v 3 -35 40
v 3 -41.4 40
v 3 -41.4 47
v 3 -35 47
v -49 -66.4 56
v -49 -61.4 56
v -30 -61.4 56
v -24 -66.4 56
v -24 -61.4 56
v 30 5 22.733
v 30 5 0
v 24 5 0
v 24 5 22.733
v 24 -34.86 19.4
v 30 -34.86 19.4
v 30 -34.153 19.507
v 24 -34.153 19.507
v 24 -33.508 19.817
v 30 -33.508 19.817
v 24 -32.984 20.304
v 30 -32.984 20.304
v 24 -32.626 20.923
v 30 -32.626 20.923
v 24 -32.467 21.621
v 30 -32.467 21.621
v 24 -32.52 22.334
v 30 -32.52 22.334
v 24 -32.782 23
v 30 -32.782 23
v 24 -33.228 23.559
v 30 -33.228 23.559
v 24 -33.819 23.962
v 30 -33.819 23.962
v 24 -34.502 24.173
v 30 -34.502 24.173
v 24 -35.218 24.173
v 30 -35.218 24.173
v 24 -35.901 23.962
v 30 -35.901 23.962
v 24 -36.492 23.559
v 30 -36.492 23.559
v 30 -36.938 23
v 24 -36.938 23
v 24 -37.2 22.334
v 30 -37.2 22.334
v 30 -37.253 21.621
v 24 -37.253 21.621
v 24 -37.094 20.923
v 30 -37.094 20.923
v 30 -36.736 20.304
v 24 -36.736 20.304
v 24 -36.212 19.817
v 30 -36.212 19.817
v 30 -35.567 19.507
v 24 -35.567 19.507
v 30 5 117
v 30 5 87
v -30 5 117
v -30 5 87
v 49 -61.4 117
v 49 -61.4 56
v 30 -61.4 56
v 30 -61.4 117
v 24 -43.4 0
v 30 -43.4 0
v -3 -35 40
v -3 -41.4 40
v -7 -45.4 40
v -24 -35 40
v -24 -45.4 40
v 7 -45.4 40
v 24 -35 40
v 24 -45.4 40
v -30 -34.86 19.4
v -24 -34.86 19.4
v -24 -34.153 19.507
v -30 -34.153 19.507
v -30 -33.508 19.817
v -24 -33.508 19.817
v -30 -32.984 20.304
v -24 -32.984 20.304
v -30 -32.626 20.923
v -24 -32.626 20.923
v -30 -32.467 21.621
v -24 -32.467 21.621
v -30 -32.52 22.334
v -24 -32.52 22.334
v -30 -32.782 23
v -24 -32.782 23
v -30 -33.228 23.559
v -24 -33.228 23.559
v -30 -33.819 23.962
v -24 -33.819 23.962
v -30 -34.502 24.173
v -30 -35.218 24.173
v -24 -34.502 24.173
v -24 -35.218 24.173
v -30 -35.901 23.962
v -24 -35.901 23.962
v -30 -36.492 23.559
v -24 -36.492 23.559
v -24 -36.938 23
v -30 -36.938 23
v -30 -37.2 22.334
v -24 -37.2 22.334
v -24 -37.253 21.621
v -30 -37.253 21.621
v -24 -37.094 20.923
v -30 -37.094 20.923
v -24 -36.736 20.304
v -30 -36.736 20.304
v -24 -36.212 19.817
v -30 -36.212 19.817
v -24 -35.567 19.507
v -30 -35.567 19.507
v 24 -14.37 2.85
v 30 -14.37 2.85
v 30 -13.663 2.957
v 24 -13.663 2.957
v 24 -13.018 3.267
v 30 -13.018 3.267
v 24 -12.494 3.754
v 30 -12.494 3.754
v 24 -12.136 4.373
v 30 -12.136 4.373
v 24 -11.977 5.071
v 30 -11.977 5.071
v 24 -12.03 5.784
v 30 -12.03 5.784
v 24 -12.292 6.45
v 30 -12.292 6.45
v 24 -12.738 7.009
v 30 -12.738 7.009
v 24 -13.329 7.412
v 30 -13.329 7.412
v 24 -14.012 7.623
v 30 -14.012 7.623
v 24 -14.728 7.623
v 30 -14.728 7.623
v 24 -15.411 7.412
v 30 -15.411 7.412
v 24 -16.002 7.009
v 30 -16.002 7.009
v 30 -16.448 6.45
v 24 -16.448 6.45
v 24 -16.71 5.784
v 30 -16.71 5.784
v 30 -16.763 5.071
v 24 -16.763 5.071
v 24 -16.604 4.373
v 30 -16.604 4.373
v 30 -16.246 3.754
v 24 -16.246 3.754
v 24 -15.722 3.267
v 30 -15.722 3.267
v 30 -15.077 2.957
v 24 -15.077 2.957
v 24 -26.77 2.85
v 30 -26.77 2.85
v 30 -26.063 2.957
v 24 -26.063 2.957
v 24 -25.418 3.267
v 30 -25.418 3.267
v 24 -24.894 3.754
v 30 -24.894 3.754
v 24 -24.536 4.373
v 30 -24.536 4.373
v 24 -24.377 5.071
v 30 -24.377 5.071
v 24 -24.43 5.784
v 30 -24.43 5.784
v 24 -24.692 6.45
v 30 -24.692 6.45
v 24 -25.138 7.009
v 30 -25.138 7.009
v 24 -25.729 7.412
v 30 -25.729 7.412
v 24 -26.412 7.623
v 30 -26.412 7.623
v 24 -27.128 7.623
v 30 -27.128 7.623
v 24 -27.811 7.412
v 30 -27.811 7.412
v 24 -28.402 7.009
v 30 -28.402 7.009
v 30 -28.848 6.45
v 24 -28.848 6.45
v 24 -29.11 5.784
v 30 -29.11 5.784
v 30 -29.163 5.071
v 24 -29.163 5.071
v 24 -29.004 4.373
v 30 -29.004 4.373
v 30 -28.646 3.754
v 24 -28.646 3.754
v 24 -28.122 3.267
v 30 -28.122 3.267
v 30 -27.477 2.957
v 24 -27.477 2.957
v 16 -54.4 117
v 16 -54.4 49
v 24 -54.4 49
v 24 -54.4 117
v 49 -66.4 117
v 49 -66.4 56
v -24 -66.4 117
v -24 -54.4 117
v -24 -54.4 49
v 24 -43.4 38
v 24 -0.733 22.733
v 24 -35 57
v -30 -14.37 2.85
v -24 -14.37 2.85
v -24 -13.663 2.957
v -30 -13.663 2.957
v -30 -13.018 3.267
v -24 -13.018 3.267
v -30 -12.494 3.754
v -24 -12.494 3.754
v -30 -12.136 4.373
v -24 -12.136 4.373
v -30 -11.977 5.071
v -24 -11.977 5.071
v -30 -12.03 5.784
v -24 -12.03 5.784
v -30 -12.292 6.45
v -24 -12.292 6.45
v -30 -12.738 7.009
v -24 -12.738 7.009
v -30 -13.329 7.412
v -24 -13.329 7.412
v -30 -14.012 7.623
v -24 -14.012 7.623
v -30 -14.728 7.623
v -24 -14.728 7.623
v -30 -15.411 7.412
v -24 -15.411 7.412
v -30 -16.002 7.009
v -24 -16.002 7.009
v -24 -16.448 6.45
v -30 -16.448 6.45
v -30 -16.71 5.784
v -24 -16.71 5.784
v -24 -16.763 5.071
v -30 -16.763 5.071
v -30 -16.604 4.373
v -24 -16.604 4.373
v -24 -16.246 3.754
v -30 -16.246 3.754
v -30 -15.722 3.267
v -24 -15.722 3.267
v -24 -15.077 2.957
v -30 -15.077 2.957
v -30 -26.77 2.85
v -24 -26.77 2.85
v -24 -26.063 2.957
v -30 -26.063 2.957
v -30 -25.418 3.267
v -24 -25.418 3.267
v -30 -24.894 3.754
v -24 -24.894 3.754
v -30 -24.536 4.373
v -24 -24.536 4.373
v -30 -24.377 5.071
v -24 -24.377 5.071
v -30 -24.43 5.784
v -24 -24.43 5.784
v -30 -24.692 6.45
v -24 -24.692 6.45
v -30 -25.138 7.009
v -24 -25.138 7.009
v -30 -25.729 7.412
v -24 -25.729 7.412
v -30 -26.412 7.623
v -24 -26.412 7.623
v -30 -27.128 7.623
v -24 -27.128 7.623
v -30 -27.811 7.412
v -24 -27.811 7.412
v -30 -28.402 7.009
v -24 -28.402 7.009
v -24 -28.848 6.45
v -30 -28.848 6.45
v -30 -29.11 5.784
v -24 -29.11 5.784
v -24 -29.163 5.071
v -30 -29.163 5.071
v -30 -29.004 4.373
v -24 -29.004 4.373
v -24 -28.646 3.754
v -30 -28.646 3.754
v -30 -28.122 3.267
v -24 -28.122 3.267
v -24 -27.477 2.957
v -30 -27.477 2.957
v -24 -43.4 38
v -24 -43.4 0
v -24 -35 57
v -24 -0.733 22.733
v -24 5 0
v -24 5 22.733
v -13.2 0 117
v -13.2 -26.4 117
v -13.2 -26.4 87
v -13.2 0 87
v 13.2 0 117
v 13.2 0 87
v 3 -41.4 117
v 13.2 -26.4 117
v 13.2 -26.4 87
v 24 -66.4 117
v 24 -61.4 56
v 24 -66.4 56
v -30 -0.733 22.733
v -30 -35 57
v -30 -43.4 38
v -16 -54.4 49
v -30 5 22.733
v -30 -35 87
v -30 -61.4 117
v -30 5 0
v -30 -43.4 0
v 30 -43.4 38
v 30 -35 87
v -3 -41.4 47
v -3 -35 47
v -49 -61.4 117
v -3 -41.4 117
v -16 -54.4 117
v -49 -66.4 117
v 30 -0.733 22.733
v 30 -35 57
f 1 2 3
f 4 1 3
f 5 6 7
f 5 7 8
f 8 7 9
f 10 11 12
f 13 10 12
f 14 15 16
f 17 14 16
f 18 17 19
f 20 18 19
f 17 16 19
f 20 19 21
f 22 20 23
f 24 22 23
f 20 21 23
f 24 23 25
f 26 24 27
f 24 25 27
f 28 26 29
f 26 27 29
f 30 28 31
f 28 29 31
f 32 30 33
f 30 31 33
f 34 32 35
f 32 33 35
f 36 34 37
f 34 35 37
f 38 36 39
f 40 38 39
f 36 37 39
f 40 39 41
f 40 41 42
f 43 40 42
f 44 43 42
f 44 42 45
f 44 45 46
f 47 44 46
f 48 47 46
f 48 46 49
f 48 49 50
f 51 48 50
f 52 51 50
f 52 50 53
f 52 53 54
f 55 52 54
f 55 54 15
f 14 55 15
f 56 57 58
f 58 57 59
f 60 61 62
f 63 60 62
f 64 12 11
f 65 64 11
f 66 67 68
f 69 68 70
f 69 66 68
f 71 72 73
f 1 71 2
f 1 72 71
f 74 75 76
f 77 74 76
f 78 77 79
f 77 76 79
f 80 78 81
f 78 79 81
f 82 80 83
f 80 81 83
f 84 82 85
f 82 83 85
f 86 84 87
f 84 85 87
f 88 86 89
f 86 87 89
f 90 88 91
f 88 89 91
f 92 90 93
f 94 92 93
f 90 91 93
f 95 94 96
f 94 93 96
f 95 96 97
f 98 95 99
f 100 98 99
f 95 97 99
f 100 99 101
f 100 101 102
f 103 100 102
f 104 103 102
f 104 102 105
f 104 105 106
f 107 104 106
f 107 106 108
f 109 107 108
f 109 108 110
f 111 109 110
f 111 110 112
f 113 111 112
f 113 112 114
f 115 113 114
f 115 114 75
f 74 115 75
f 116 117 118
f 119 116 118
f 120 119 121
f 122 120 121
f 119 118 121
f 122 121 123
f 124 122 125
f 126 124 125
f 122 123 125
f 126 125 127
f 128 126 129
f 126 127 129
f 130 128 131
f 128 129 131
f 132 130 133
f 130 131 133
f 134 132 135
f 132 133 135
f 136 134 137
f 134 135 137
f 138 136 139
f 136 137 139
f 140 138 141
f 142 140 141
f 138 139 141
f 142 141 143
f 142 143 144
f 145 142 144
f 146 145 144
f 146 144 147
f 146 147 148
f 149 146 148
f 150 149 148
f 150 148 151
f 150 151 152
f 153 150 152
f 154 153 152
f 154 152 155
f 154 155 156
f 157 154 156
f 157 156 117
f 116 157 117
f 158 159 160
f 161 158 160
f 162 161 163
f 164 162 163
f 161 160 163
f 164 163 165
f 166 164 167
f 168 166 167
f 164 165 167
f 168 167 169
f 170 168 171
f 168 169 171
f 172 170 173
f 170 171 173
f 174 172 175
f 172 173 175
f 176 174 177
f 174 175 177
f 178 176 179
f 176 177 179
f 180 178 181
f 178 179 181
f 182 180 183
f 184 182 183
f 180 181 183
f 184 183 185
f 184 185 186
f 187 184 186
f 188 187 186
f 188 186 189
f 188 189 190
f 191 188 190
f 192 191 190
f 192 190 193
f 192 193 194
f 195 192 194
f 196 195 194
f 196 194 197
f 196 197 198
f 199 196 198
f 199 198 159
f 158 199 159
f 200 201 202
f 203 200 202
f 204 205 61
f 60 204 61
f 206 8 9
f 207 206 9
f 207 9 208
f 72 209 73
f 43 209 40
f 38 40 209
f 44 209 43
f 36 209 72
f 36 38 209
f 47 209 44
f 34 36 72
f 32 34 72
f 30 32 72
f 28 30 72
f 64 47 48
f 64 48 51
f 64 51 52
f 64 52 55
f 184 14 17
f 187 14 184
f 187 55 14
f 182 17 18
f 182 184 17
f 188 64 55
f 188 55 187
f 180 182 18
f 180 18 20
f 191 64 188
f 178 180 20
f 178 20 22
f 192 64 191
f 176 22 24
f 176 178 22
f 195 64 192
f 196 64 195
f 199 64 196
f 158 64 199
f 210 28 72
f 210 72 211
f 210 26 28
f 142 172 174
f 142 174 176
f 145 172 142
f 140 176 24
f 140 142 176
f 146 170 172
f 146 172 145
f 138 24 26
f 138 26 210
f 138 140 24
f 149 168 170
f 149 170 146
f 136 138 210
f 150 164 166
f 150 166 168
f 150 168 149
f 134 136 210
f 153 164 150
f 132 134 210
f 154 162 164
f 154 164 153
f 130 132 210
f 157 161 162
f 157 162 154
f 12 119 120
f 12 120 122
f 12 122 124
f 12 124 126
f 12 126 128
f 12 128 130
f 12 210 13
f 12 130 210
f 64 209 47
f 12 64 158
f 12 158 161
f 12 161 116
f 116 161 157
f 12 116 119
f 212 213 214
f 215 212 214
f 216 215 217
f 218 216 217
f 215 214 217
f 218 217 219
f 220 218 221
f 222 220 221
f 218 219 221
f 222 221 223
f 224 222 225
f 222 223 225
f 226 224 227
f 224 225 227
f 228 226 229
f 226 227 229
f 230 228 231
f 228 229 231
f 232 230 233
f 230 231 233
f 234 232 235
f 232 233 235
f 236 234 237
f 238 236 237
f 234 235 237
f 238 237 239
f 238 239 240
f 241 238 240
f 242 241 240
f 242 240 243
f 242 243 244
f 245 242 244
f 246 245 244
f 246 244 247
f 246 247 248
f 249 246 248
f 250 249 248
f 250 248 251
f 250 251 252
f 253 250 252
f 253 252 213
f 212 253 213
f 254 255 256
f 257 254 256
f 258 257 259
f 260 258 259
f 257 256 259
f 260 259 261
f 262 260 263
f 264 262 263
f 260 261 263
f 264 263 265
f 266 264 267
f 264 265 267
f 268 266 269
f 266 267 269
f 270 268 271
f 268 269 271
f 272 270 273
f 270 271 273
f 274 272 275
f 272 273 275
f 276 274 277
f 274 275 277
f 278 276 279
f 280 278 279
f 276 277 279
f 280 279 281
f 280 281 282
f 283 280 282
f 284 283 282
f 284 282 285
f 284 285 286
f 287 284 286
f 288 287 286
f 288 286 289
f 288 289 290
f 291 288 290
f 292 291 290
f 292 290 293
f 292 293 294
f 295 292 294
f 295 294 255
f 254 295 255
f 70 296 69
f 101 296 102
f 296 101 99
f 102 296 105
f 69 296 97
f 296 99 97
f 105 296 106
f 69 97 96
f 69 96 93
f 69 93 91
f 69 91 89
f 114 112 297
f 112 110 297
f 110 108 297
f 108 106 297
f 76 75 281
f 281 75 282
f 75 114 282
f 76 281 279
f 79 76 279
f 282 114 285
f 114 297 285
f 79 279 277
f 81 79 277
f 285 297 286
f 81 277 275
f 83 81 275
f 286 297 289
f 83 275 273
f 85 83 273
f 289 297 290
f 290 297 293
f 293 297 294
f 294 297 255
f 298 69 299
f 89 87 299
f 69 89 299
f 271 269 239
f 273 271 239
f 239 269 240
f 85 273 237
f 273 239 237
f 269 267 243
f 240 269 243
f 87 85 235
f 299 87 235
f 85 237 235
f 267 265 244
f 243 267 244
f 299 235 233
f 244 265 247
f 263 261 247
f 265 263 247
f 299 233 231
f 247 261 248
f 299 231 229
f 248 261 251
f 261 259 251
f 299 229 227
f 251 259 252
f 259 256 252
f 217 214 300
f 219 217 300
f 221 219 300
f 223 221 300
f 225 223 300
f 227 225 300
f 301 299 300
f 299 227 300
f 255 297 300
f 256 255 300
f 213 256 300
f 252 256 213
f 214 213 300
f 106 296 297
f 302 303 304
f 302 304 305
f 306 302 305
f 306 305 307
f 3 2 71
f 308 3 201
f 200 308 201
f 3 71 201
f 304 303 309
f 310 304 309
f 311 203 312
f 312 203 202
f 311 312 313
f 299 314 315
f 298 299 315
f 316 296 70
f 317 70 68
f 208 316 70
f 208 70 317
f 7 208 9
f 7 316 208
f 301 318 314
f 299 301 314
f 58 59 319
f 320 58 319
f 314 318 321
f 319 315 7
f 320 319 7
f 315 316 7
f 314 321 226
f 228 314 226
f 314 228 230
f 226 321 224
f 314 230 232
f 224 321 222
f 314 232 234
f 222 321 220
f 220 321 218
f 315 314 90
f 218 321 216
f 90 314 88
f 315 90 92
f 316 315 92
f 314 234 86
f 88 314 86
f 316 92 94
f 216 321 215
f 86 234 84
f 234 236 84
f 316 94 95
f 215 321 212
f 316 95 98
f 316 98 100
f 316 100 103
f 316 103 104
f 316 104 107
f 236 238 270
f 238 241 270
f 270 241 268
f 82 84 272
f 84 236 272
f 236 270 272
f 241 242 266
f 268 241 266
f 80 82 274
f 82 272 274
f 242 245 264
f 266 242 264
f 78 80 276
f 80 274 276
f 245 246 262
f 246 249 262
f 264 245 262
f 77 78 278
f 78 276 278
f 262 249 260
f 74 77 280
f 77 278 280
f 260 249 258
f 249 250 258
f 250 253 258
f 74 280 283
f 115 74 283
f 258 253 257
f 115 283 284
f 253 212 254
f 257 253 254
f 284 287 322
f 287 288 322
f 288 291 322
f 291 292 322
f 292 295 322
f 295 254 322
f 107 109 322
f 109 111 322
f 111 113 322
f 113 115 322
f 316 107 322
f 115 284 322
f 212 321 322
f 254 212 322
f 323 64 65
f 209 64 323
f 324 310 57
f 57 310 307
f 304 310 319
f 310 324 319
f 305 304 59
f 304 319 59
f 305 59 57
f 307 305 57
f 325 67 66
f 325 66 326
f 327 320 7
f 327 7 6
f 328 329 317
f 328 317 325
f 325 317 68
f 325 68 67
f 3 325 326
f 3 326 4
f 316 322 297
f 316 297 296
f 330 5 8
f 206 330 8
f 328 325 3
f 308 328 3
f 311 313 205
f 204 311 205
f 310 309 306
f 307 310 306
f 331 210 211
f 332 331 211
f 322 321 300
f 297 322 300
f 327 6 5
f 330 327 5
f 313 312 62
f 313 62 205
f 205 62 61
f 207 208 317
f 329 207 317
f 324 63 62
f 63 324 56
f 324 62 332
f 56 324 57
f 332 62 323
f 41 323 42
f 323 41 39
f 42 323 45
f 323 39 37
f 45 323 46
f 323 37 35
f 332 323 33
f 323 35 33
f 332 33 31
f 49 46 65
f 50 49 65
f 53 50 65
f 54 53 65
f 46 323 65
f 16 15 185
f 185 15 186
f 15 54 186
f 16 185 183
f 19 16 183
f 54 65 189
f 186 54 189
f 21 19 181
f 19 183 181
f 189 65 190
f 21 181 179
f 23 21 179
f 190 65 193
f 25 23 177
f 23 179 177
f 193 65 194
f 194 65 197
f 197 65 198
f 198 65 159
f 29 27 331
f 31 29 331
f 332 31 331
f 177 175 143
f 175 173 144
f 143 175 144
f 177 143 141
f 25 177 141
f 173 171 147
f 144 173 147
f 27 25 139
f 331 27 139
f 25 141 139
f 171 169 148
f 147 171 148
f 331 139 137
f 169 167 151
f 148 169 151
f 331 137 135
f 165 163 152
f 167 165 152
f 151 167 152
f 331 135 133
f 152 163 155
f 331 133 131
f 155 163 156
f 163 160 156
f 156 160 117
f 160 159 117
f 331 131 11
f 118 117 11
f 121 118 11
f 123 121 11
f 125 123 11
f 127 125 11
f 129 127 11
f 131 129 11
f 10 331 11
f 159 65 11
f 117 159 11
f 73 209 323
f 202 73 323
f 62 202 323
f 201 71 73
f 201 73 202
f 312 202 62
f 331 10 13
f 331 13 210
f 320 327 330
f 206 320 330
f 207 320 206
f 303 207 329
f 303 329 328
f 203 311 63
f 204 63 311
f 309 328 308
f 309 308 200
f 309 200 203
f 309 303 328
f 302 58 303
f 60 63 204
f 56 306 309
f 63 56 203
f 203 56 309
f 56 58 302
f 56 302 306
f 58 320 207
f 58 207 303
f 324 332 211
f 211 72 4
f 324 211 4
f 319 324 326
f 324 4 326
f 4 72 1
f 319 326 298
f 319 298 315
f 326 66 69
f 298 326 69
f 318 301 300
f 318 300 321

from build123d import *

# Parameters (mm, degrees)
SKETCH1_W            = 26.4
SKETCH1_H            = 26.4
BOSS_EXTRUDE1_DEPTH  = 117
SKETCH60_W           = 48
SKETCH60_H           = 40
CUT_EXTRUDE1_DEPTH   = 87
CUT_EXTRUDE2_DEPTH   = 157.009486891
M4_CLEARANCE_HOLE1_D = 4.8
SKETCH66_W           = 48
SKETCH66_H           = 31.290838495
CUT_EXTRUDE3_DEPTH   = 40
CUT_EXTRUDE5_DEPTH   = 157.009486891
SKETCH69_W           = 98
SKETCH69_H           = 56
CUT_EXTRUDE6_DEPTH   = 144.174578749
SKETCH70_W           = 6
SKETCH70_H           = 7
CUT_EXTRUDE7_DEPTH   = 136.066502139


with BuildPart() as part:
    # Sketch1 → Boss-Extrude1 (new body)
    with BuildSketch(Plane.XY):
        Polygon((-3, -41.4), (3, -41.4), (16, -54.4), (24, -54.4), (24, -66.4), (49, -66.4), (49, -61.4), (30, -61.4), (30, 5), (-30, 5), (-30, -61.4), (-49, -61.4), (-49, -66.4), (-24, -66.4), (-24, -54.4), (-16, -54.4), align=None)
        with Locations((0, -13.2)):
            Rectangle(SKETCH1_W, SKETCH1_H, mode=Mode.SUBTRACT)
    extrude(amount=BOSS_EXTRUDE1_DEPTH)

    # Sketch60 → Cut-Extrude1 (cut)
    with BuildSketch(Plane(origin=(0, 0, 0), x_dir=(-1, 0, 0), z_dir=(0, 0, -1))):
        with Locations((0, -15)):
            Rectangle(SKETCH60_W, SKETCH60_H)
    extrude(amount=-CUT_EXTRUDE1_DEPTH, mode=Mode.SUBTRACT)

    # Sketch61 → Cut-Extrude2 (cut, through all)
    with BuildSketch(Plane.ZY.offset(30)):
        Polygon((0, -43.4), (38, -43.4), (56, -61.4), (0, -61.4), align=None)
    extrude(amount=-CUT_EXTRUDE2_DEPTH, mode=Mode.SUBTRACT)

    # M4 Clearance Hole1 (through all)
    with Locations(Plane.ZY.offset(30)):
        with Locations((5.25, -14.37), (5.25, -26.77), (21.8, -34.86)):
            Hole(M4_CLEARANCE_HOLE1_D / 2)

    # Sketch66 → Cut-Extrude3 (cut)
    with BuildSketch(Plane(origin=(0, 0, 0), x_dir=(-1, 0, 0), z_dir=(0, 0, -1))):
        with Locations((0, -50.645419248)):
            Rectangle(SKETCH66_W, SKETCH66_H)
    extrude(amount=-CUT_EXTRUDE3_DEPTH, mode=Mode.SUBTRACT)

    # Sketch68 → Cut-Extrude5 (cut, through all)
    with BuildSketch(Plane.ZY.offset(30)):
        Polygon((22.733334145, -0.733334145), (57, -35), (87, -35), (87, 5), (22.733334145, 5), align=None)
    extrude(amount=-CUT_EXTRUDE5_DEPTH, mode=Mode.SUBTRACT)

    # Sketch69 → Cut-Extrude6 (cut, through all)
    with BuildSketch(Plane(origin=(0, -61.4, 0), x_dir=(1, 0, 0), z_dir=(0, 1, 0))):
        with Locations((0, -28)):
            Rectangle(SKETCH69_W, SKETCH69_H)
    extrude(amount=-CUT_EXTRUDE6_DEPTH, mode=Mode.SUBTRACT)

    # Sketch70 → Cut-Extrude7 (cut, through all)
    with BuildSketch(Plane.XZ.offset(41.4)):
        with Locations((0, 43.5)):
            Rectangle(SKETCH70_W, SKETCH70_H)
    extrude(amount=-CUT_EXTRUDE7_DEPTH, mode=Mode.SUBTRACT)


solid = part.part
